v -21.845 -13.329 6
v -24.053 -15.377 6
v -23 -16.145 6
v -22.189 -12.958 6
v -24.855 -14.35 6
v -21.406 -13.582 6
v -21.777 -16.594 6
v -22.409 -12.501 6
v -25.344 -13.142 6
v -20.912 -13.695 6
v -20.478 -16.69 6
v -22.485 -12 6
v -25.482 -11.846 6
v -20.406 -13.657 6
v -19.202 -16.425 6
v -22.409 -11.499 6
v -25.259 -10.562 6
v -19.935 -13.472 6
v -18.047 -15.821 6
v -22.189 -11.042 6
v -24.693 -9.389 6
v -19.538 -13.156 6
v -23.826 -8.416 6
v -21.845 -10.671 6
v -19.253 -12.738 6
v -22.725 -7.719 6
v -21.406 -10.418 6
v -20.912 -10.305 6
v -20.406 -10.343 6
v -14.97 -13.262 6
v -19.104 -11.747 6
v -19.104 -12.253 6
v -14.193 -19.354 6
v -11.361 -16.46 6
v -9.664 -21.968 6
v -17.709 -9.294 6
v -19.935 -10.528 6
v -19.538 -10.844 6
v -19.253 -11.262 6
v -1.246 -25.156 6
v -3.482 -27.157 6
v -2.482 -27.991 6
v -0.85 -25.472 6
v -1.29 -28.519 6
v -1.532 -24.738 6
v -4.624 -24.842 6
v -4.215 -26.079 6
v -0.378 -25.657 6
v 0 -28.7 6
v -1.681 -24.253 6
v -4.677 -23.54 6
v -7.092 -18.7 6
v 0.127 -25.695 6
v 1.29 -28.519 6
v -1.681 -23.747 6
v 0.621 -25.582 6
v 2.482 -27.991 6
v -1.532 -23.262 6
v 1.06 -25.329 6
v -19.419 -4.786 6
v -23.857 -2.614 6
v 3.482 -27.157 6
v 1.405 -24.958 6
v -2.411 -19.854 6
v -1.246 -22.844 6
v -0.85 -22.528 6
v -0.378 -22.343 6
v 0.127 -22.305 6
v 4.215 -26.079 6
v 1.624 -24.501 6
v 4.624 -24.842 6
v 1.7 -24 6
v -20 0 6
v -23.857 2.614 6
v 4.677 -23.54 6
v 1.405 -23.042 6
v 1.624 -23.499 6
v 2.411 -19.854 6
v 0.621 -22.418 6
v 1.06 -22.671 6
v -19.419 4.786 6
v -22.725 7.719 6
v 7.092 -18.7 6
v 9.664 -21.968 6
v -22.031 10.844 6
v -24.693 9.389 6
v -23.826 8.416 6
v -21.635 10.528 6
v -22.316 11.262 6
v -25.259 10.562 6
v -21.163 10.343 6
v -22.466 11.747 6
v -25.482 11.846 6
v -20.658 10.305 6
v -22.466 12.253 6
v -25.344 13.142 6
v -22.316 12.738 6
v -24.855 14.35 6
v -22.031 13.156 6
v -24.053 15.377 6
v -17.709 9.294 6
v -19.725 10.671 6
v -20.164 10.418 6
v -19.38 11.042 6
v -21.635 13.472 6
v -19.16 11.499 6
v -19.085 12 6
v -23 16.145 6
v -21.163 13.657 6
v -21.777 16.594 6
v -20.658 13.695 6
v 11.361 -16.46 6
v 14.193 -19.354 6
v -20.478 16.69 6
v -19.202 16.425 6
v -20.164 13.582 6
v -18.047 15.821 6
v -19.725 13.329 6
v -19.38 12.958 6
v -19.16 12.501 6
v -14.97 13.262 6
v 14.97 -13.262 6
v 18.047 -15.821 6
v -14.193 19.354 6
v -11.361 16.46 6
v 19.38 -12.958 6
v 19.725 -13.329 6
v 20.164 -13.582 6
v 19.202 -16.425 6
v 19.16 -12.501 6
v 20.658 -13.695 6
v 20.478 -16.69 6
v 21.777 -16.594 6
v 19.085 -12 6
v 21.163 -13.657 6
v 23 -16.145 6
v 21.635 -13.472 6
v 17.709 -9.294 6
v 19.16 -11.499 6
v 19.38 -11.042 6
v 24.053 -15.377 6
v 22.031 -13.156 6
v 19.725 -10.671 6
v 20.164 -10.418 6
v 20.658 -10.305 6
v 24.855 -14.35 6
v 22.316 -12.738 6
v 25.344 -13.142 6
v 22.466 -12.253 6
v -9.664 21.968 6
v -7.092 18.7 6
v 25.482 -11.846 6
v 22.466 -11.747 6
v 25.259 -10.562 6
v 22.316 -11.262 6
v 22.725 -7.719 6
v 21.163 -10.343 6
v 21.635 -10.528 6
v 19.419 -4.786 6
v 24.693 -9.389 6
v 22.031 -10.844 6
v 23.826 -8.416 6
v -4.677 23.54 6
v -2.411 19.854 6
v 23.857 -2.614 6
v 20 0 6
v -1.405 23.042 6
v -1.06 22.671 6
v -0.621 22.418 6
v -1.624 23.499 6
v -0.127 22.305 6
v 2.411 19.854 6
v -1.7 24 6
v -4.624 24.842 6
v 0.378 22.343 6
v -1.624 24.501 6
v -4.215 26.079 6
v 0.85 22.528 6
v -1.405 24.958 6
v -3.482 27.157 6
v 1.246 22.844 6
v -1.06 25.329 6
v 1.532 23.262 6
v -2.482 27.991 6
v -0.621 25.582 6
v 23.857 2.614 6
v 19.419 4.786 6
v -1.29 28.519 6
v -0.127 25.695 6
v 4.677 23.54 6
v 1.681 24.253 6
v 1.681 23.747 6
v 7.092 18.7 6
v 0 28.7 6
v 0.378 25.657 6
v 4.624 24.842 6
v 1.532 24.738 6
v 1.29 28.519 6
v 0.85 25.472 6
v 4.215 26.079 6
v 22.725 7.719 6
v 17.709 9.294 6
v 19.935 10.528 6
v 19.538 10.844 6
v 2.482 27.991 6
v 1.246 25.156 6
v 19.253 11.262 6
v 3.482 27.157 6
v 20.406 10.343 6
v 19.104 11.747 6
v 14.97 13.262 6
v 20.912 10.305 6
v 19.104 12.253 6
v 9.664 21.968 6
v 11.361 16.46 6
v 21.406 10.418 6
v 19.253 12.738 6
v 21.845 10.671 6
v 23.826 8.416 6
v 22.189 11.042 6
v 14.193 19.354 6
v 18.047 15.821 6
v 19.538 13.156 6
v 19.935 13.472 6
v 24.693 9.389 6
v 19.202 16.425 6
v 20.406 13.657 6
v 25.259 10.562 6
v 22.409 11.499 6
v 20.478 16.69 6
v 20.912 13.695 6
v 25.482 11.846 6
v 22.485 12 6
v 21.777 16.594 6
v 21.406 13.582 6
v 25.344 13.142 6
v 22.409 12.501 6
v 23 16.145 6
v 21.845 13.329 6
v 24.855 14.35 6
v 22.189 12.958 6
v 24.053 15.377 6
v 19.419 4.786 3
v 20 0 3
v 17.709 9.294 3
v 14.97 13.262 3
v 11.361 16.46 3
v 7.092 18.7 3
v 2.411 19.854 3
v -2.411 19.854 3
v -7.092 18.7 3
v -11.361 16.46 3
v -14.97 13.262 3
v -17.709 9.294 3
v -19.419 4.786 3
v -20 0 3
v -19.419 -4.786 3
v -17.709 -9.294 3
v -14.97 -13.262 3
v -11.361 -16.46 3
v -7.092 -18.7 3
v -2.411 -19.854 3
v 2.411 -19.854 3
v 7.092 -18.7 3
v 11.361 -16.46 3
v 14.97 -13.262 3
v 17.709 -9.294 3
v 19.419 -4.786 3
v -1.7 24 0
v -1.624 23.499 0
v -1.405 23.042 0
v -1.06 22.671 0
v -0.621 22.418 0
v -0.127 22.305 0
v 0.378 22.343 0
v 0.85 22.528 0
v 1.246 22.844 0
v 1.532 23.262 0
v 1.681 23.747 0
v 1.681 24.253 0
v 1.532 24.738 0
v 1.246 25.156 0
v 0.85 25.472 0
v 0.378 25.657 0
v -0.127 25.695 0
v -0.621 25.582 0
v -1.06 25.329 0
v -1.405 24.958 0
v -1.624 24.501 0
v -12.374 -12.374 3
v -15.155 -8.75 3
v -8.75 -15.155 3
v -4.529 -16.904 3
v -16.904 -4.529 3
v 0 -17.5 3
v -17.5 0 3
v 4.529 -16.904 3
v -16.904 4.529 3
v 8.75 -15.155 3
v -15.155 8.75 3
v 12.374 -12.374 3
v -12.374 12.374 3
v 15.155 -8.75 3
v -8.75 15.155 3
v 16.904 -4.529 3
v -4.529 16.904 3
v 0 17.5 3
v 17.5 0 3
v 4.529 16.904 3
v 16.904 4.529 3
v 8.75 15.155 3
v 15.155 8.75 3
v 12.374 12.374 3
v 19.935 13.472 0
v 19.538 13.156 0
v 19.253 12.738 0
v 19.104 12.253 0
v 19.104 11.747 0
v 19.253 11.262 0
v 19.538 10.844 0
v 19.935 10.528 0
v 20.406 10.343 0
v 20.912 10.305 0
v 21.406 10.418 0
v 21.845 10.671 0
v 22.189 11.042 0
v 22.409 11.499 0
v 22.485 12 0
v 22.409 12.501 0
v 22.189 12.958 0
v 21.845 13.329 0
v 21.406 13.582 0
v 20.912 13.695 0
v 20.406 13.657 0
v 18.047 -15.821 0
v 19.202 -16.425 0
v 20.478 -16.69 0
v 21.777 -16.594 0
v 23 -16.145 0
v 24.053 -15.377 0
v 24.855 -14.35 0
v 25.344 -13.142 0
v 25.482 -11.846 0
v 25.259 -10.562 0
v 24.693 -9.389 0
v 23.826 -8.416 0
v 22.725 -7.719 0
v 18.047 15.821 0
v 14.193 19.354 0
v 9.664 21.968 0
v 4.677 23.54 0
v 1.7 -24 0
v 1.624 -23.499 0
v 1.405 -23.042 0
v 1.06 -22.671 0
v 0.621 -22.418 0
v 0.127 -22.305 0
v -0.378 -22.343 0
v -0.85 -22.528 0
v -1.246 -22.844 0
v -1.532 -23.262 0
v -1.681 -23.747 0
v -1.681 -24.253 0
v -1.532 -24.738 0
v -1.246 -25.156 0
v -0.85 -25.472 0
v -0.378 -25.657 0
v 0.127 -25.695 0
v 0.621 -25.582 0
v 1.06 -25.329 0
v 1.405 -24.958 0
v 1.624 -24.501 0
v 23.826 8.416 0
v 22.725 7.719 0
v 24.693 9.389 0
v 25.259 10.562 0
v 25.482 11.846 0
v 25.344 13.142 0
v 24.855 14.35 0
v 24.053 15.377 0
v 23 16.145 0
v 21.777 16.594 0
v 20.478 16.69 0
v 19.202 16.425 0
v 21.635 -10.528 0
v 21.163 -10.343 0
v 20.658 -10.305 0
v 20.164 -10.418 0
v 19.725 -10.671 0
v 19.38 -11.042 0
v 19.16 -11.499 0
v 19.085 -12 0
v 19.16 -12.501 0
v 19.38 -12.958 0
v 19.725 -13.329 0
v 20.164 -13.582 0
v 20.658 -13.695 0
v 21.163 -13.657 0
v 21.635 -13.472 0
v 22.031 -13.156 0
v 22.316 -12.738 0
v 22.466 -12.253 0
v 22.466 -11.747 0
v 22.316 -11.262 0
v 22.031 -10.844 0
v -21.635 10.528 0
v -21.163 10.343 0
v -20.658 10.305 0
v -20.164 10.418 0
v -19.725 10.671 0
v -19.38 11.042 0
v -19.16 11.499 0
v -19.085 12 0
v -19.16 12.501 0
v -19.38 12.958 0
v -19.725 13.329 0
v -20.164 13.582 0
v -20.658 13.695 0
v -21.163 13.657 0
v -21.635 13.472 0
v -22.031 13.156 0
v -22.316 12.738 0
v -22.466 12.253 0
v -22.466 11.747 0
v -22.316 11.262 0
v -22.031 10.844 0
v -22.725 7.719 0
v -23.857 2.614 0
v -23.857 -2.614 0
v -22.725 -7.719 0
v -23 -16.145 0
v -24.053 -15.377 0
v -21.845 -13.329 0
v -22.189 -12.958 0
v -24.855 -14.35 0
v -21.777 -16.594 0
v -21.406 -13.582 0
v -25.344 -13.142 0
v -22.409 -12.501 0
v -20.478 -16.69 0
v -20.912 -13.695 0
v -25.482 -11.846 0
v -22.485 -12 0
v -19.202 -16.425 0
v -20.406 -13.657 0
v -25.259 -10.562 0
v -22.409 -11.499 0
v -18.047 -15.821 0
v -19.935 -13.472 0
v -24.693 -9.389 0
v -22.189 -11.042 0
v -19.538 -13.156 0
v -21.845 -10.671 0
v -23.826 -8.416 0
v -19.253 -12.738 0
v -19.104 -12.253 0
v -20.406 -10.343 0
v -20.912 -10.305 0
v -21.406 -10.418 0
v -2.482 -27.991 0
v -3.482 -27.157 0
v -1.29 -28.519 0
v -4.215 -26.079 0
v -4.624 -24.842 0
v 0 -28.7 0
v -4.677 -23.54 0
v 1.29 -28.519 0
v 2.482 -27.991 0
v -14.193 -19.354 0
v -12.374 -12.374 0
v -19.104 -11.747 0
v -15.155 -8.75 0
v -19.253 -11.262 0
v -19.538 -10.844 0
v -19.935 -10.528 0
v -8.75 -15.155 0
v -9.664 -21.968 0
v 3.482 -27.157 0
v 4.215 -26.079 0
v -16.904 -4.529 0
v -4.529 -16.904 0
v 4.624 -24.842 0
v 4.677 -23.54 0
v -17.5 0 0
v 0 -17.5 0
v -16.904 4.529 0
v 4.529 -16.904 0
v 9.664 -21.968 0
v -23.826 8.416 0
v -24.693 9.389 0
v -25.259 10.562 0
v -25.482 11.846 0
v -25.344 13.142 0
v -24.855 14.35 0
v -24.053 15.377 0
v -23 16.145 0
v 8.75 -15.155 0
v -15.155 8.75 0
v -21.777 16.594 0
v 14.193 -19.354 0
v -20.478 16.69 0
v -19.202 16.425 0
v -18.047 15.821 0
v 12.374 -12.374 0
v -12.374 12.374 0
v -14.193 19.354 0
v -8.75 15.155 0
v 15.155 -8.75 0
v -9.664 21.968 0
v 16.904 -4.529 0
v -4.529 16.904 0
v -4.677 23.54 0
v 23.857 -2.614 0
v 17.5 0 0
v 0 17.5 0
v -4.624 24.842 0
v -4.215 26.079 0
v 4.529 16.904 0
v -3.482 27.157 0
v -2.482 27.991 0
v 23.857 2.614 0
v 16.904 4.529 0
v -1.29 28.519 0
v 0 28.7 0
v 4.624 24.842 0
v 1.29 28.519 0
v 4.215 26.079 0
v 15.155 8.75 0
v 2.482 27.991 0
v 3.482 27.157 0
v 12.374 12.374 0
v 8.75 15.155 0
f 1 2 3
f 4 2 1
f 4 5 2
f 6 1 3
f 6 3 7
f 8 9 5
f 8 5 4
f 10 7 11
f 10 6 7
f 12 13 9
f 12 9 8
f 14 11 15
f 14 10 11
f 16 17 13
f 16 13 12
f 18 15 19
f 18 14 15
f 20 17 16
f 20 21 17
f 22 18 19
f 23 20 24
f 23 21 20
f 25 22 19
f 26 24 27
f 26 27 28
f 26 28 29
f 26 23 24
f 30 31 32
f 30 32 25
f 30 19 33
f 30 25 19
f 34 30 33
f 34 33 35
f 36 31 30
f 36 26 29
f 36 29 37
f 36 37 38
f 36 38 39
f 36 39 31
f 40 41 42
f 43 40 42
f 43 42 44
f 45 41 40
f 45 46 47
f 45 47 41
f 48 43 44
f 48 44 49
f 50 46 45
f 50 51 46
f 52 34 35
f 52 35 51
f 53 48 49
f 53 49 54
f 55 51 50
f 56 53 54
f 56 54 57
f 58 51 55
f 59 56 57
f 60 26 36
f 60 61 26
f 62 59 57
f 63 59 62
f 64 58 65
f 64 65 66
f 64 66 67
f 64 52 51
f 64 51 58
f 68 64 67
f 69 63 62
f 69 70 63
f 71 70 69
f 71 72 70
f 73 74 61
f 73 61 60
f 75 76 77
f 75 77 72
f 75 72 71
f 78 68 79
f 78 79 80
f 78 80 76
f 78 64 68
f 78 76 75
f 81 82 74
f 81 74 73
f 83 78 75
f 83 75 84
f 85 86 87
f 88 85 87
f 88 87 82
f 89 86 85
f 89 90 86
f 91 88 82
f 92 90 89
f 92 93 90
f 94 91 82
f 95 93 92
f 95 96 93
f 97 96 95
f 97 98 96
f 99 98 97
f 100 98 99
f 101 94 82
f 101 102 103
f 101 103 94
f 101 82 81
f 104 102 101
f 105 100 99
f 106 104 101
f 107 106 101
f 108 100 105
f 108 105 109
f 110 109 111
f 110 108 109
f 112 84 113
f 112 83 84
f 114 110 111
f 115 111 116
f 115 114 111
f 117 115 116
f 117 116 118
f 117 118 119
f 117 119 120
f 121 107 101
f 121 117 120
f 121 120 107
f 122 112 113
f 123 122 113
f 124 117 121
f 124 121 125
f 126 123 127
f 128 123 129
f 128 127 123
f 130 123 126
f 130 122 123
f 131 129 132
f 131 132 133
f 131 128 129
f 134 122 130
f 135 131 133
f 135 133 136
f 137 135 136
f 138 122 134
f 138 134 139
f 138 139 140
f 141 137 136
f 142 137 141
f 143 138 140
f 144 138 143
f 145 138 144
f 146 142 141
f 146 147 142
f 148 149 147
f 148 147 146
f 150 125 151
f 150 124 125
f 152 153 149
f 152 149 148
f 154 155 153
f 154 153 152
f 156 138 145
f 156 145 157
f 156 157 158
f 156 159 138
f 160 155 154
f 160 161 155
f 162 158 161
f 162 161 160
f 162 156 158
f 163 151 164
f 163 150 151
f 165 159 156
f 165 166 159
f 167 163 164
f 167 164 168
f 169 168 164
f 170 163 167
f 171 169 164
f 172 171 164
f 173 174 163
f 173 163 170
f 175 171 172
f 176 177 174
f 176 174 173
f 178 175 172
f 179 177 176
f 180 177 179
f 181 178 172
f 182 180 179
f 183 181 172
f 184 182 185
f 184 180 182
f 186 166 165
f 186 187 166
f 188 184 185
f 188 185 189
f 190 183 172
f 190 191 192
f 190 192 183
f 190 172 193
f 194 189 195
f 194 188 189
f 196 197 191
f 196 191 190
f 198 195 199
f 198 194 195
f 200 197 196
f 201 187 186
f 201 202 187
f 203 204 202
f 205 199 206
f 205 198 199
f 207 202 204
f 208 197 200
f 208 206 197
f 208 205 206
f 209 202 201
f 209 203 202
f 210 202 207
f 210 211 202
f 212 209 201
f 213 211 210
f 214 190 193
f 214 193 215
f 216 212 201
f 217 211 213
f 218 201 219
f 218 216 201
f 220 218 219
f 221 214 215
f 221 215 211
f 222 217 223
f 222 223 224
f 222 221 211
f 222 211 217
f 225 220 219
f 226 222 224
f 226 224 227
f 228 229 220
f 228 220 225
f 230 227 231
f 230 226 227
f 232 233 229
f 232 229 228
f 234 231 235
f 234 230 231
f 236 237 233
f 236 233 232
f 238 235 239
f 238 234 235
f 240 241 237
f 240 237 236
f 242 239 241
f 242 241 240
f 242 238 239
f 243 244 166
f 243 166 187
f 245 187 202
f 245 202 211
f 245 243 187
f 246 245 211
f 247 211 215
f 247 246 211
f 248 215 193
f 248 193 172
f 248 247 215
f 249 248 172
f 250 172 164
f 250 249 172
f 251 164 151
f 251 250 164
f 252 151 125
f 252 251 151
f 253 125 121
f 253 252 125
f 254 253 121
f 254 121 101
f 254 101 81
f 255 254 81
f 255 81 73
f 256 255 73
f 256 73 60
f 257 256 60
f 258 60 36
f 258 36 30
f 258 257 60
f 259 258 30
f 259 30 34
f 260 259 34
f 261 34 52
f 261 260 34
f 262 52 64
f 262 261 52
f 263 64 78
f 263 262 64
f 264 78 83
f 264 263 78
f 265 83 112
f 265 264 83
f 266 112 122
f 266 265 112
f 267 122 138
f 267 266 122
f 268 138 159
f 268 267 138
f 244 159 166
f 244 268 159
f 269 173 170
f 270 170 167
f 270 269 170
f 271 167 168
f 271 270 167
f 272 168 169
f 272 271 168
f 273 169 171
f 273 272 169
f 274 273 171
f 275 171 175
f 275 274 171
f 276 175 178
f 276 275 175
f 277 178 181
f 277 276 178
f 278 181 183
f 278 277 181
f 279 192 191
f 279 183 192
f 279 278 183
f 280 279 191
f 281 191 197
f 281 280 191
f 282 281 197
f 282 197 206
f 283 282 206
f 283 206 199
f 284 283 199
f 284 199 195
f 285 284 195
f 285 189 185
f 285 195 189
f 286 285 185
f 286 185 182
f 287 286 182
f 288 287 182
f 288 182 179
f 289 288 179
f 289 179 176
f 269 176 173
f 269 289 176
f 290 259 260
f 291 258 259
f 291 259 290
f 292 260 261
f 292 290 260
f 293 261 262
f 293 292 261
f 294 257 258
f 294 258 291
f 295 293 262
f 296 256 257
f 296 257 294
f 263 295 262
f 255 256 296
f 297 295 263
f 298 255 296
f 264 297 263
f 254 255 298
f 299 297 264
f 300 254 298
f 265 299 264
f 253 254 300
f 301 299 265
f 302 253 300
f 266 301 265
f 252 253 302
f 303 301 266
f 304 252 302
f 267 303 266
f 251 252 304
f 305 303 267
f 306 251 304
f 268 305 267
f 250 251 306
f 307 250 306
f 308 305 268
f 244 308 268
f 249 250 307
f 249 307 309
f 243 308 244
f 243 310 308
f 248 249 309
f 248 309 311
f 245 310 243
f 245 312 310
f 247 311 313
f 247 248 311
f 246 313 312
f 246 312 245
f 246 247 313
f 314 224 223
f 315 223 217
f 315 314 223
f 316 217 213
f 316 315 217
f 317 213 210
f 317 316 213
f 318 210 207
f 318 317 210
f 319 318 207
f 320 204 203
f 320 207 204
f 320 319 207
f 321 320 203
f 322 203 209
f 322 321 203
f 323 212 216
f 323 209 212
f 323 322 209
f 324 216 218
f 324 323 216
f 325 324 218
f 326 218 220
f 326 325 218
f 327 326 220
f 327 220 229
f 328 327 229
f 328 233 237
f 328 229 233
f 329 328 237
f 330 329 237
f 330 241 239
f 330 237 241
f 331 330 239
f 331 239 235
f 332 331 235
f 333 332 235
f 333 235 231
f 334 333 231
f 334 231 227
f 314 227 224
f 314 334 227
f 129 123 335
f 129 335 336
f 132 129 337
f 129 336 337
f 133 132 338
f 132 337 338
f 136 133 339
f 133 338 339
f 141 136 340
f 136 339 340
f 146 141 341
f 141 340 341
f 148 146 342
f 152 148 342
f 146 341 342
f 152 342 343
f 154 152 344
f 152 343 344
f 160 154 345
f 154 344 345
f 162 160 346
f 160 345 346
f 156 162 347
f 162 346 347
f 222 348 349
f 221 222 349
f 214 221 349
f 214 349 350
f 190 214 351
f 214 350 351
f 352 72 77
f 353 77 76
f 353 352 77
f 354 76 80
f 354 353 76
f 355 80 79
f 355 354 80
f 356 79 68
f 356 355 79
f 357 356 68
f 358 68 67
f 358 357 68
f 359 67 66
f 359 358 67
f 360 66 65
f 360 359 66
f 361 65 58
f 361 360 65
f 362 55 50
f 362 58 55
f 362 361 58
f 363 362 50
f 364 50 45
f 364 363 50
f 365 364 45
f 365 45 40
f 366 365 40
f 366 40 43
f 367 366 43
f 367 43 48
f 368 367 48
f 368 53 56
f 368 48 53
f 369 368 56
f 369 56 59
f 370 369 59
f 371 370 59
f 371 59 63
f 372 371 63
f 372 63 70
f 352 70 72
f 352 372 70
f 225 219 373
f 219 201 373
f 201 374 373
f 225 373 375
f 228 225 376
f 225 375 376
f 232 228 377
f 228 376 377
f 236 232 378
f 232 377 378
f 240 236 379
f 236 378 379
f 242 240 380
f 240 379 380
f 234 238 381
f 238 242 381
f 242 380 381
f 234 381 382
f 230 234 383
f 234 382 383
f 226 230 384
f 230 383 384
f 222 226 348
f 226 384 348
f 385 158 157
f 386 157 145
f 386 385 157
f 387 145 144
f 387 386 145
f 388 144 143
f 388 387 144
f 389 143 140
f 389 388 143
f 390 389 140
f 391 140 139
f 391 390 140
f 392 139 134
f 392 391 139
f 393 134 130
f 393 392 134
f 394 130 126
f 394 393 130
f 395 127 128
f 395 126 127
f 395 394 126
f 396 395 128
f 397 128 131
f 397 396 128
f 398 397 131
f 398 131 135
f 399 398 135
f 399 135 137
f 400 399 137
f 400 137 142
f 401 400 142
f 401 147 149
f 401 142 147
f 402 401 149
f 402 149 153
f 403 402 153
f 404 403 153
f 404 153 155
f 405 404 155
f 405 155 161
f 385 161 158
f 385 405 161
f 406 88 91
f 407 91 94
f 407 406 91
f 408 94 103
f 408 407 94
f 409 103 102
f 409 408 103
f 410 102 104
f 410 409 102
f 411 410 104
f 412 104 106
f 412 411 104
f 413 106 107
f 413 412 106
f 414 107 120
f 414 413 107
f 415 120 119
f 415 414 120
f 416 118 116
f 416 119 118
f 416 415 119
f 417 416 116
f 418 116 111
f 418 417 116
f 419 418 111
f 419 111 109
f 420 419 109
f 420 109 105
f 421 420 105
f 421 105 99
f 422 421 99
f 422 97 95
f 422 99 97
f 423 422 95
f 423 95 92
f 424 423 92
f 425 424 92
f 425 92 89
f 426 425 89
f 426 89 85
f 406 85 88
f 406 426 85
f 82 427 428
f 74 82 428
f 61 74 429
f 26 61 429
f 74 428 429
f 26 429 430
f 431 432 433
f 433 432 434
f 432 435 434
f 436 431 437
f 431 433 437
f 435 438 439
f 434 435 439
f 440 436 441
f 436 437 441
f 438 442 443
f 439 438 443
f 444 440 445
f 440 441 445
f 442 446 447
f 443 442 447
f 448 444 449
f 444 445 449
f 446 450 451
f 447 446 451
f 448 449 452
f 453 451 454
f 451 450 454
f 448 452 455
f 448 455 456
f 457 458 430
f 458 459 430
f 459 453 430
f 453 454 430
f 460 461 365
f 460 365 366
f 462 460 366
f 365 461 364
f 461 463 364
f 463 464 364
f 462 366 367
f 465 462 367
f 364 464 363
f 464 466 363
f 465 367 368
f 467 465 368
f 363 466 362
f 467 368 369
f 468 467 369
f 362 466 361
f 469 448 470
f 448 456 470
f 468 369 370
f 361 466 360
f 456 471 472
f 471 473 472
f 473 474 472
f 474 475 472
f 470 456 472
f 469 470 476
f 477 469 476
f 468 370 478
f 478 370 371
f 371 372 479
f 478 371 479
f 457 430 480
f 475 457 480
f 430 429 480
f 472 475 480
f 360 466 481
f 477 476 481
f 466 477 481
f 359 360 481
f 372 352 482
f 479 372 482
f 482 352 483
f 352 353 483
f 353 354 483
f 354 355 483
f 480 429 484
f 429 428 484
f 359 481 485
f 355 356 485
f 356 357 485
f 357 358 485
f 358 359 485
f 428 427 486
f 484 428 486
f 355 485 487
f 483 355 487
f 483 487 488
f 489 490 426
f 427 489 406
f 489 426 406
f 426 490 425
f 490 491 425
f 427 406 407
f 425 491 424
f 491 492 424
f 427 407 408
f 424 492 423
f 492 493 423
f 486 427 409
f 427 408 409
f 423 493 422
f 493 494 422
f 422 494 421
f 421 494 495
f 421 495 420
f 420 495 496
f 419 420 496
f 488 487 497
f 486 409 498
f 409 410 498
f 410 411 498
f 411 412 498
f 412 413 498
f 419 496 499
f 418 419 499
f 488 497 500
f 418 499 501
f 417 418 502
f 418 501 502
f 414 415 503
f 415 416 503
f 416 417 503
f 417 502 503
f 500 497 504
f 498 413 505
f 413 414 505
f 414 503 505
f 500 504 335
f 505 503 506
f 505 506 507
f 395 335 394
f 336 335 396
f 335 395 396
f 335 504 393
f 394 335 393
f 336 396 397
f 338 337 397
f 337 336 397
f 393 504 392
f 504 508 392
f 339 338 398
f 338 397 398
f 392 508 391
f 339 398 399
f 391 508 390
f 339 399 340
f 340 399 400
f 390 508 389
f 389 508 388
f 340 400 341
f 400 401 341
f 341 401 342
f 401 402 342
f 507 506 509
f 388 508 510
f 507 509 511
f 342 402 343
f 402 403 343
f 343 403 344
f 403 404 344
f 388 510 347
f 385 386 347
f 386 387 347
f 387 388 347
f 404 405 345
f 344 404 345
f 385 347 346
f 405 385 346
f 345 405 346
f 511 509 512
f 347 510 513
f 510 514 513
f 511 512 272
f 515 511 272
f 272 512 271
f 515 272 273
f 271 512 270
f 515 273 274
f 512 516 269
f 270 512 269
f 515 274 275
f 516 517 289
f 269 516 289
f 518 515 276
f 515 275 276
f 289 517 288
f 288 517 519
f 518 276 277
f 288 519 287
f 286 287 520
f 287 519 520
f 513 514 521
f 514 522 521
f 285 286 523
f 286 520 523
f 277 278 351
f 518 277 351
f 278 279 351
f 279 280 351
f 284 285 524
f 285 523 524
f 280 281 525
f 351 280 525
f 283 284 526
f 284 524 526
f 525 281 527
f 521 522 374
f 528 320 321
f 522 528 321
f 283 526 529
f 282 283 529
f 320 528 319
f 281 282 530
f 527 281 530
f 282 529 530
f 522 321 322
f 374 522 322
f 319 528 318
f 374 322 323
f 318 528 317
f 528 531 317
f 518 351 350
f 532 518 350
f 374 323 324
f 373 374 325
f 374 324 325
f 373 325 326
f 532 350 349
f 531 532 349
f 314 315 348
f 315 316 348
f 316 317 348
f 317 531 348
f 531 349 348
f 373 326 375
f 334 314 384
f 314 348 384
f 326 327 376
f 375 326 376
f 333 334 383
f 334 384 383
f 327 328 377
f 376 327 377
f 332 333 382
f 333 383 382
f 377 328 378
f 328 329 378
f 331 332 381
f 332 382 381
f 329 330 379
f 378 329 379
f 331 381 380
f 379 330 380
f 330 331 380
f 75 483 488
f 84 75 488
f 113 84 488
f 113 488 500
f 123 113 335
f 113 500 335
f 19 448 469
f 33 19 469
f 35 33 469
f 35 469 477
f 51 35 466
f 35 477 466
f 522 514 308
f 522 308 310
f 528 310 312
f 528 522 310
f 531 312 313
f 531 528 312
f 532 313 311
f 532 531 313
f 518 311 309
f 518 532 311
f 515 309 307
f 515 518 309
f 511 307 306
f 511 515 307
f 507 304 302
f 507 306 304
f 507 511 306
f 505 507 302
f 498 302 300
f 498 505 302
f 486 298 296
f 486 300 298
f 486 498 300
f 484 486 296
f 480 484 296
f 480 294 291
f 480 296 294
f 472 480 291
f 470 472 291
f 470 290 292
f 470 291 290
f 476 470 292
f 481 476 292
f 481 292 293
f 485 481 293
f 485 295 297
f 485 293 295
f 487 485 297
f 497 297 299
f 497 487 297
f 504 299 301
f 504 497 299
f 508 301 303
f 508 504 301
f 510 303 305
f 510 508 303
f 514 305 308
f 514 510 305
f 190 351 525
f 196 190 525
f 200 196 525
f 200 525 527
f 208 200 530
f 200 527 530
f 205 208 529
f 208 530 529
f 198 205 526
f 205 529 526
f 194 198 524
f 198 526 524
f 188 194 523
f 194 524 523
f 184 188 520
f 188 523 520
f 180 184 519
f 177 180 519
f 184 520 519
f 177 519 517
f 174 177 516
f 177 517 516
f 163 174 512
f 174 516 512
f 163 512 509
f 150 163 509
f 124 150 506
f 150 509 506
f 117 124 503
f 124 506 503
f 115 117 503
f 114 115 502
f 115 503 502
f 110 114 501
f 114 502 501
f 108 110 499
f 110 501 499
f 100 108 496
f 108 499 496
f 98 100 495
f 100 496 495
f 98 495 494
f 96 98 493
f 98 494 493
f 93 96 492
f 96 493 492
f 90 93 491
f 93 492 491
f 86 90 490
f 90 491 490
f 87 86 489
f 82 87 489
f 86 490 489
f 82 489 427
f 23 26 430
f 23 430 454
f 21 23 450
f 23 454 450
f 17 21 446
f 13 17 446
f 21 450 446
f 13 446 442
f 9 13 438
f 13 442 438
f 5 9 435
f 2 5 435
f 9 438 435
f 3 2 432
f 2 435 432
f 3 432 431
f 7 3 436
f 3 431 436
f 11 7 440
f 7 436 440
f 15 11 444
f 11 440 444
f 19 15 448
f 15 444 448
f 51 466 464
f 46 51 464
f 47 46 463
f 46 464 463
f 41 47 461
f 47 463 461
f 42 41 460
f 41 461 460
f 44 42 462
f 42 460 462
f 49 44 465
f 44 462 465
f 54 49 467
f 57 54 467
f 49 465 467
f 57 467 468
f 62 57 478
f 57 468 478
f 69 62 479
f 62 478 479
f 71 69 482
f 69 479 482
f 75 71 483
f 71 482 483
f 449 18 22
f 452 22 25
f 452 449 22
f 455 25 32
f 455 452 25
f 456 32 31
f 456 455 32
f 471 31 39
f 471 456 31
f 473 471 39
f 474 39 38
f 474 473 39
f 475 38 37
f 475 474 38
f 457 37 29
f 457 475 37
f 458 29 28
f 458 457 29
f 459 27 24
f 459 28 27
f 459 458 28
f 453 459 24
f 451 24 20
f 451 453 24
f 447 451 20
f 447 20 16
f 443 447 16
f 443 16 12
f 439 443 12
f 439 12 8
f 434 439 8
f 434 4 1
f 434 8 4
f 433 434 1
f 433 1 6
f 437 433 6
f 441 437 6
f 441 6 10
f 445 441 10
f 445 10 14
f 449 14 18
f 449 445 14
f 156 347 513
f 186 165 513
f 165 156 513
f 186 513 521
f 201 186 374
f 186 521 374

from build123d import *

# Parameters (mm, degrees)
CYLINDER002_R     = 17.5
CYLINDER002_DEPTH = 10
CYLINDER_R        = 20
CYLINDER_DEPTH    = 3
CYLINDER003_R     = 1.7
CYLINDER003_DEPTH = 10
ARRAY001_COUNT    = 6
CYLINDER001_R     = 24
CYLINDER001_DEPTH = 6
CYLINDER004_R     = 4.7
CYLINDER004_DEPTH = 6
ARRAY_COUNT       = 6


with BuildPart() as cylinder002:
    # Cylinder002 → Cylinder002 (new body)
    with BuildSketch(Plane.XY):
        Circle(CYLINDER002_R)
    extrude(amount=CYLINDER002_DEPTH)


with BuildPart() as cylinder:
    # Cylinder → Cylinder (new body)
    with BuildSketch(Plane.XY.offset(3)):
        Circle(CYLINDER_R)
    extrude(amount=CYLINDER_DEPTH)


with BuildPart() as fusion001:
    # Cylinder003 → Cylinder003 (new body)
    with BuildSketch(Plane(origin=(0, -24, 0), x_dir=(1, 0, 0), z_dir=(0, 0, 1))):
        Circle(CYLINDER003_R)
    extrude(amount=CYLINDER003_DEPTH)

    # Array001: Fusion001 ×6 about axis
    array001_axis = Axis((0, 0, 0), (0, 0, 1))


with BuildPart() as fusion001_1:
    add(fusion001.part)
    for i in range(1, ARRAY001_COUNT):
        add(fusion001.part.rotate(array001_axis, i * 360 / ARRAY001_COUNT))

    # Fusion001: union Cylinder002, Cylinder
    add(cylinder002.part)
    add(cylinder.part)


with BuildPart() as cylinder001:
    # Cylinder001 → Cylinder001 (new body)
    with BuildSketch(Plane.XY):
        Circle(CYLINDER001_R)
    extrude(amount=CYLINDER001_DEPTH)


with BuildPart() as cut:
    # Cylinder004 → Cylinder004 (new body)
    with BuildSketch(Plane(origin=(0, -24, 0), x_dir=(1, 0, 0), z_dir=(0, 0, 1))):
        Circle(CYLINDER004_R)
    extrude(amount=CYLINDER004_DEPTH)

    # Array: Cut ×6 about axis
    array_axis = Axis((0, 0, 0), (0, 0, 1))


with BuildPart() as cut_1:
    add(cut.part)
    for i in range(1, ARRAY_COUNT):
        add(cut.part.rotate(array_axis, i * 360 / ARRAY_COUNT))

    # Fusion: union Cylinder001
    add(cylinder001.part)

    # Cut: cut Fusion001
    add(fusion001_1.part, mode=Mode.SUBTRACT)


solid = cut_1.part
